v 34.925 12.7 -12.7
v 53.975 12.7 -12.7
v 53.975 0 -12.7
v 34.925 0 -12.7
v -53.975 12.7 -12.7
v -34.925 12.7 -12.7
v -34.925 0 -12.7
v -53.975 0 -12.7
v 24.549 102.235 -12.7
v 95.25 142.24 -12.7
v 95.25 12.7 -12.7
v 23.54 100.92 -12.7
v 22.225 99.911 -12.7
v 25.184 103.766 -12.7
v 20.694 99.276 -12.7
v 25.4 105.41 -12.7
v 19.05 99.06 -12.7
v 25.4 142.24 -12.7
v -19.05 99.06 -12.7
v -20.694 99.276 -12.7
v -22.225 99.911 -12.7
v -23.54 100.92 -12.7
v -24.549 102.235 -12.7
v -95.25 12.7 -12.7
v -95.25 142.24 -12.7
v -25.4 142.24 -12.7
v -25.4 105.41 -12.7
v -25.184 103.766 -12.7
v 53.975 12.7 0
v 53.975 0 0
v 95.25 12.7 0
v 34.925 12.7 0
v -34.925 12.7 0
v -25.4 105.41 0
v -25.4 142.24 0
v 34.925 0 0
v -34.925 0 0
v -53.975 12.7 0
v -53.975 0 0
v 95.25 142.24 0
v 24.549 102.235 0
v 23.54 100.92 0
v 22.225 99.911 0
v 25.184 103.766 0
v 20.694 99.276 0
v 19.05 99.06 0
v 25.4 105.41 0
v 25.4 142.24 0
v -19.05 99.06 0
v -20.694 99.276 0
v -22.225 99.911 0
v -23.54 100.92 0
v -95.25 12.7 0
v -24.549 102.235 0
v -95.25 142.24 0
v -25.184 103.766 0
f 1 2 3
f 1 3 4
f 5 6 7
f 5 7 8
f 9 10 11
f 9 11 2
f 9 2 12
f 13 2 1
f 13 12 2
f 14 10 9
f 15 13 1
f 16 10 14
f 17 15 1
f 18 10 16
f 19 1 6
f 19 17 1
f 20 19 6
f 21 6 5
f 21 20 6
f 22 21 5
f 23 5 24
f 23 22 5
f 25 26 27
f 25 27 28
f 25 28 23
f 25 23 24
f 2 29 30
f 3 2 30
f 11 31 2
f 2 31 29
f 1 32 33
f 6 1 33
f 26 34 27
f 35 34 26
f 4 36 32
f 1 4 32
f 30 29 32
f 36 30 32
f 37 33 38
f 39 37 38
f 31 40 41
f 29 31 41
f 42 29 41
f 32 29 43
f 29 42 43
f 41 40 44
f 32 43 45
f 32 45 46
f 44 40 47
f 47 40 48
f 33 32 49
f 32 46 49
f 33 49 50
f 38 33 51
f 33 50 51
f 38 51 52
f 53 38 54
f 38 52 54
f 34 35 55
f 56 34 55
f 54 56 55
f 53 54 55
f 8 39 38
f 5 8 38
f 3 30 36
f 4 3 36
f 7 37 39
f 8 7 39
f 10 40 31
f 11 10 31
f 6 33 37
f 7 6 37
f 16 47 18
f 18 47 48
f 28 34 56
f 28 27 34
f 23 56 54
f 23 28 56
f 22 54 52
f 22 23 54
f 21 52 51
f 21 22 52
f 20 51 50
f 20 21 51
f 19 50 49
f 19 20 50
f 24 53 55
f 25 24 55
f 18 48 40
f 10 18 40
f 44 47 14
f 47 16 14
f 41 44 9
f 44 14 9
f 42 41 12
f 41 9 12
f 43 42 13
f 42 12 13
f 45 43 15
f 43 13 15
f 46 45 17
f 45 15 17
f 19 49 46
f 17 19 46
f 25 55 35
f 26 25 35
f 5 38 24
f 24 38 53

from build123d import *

# Parameters (mm, degrees)
EXTRUDE1_DEPTH     = 12.7
SKETCH2_W          = 50.8
SKETCH2_H          = 43.18
CUT_EXTRUDE1_DEPTH = 172.656838198
FILLET1_R          = 6.35


with BuildPart() as part:
    # Sketch1 → Extrude1 (new body)
    with BuildSketch(Plane.XY):
        Polygon((-95.25, 142.24), (95.25, 142.24), (95.25, 12.7), (53.975, 12.7), (53.975, 0), (34.925, 0), (34.925, 12.7), (-34.925, 12.7), (-34.925, 0), (-53.975, 0), (-53.975, 12.7), (-95.25, 12.7), align=None)
    extrude(amount=-EXTRUDE1_DEPTH)

    # Sketch2 → Cut-Extrude1 (cut, through all)
    with BuildSketch(Plane.XY):
        with Locations((0, 120.65)):
            Rectangle(SKETCH2_W, SKETCH2_H)
    extrude(amount=-CUT_EXTRUDE1_DEPTH, mode=Mode.SUBTRACT)

    # Fillet1
    fillet1_edges = [part.edges().sort_by_distance(p)[0] for p in [
        (-25.4, 99.06, -6.35),
        (25.4, 99.06, -6.35),
    ]]
    fillet(fillet1_edges, radius=FILLET1_R)


solid = part.part
